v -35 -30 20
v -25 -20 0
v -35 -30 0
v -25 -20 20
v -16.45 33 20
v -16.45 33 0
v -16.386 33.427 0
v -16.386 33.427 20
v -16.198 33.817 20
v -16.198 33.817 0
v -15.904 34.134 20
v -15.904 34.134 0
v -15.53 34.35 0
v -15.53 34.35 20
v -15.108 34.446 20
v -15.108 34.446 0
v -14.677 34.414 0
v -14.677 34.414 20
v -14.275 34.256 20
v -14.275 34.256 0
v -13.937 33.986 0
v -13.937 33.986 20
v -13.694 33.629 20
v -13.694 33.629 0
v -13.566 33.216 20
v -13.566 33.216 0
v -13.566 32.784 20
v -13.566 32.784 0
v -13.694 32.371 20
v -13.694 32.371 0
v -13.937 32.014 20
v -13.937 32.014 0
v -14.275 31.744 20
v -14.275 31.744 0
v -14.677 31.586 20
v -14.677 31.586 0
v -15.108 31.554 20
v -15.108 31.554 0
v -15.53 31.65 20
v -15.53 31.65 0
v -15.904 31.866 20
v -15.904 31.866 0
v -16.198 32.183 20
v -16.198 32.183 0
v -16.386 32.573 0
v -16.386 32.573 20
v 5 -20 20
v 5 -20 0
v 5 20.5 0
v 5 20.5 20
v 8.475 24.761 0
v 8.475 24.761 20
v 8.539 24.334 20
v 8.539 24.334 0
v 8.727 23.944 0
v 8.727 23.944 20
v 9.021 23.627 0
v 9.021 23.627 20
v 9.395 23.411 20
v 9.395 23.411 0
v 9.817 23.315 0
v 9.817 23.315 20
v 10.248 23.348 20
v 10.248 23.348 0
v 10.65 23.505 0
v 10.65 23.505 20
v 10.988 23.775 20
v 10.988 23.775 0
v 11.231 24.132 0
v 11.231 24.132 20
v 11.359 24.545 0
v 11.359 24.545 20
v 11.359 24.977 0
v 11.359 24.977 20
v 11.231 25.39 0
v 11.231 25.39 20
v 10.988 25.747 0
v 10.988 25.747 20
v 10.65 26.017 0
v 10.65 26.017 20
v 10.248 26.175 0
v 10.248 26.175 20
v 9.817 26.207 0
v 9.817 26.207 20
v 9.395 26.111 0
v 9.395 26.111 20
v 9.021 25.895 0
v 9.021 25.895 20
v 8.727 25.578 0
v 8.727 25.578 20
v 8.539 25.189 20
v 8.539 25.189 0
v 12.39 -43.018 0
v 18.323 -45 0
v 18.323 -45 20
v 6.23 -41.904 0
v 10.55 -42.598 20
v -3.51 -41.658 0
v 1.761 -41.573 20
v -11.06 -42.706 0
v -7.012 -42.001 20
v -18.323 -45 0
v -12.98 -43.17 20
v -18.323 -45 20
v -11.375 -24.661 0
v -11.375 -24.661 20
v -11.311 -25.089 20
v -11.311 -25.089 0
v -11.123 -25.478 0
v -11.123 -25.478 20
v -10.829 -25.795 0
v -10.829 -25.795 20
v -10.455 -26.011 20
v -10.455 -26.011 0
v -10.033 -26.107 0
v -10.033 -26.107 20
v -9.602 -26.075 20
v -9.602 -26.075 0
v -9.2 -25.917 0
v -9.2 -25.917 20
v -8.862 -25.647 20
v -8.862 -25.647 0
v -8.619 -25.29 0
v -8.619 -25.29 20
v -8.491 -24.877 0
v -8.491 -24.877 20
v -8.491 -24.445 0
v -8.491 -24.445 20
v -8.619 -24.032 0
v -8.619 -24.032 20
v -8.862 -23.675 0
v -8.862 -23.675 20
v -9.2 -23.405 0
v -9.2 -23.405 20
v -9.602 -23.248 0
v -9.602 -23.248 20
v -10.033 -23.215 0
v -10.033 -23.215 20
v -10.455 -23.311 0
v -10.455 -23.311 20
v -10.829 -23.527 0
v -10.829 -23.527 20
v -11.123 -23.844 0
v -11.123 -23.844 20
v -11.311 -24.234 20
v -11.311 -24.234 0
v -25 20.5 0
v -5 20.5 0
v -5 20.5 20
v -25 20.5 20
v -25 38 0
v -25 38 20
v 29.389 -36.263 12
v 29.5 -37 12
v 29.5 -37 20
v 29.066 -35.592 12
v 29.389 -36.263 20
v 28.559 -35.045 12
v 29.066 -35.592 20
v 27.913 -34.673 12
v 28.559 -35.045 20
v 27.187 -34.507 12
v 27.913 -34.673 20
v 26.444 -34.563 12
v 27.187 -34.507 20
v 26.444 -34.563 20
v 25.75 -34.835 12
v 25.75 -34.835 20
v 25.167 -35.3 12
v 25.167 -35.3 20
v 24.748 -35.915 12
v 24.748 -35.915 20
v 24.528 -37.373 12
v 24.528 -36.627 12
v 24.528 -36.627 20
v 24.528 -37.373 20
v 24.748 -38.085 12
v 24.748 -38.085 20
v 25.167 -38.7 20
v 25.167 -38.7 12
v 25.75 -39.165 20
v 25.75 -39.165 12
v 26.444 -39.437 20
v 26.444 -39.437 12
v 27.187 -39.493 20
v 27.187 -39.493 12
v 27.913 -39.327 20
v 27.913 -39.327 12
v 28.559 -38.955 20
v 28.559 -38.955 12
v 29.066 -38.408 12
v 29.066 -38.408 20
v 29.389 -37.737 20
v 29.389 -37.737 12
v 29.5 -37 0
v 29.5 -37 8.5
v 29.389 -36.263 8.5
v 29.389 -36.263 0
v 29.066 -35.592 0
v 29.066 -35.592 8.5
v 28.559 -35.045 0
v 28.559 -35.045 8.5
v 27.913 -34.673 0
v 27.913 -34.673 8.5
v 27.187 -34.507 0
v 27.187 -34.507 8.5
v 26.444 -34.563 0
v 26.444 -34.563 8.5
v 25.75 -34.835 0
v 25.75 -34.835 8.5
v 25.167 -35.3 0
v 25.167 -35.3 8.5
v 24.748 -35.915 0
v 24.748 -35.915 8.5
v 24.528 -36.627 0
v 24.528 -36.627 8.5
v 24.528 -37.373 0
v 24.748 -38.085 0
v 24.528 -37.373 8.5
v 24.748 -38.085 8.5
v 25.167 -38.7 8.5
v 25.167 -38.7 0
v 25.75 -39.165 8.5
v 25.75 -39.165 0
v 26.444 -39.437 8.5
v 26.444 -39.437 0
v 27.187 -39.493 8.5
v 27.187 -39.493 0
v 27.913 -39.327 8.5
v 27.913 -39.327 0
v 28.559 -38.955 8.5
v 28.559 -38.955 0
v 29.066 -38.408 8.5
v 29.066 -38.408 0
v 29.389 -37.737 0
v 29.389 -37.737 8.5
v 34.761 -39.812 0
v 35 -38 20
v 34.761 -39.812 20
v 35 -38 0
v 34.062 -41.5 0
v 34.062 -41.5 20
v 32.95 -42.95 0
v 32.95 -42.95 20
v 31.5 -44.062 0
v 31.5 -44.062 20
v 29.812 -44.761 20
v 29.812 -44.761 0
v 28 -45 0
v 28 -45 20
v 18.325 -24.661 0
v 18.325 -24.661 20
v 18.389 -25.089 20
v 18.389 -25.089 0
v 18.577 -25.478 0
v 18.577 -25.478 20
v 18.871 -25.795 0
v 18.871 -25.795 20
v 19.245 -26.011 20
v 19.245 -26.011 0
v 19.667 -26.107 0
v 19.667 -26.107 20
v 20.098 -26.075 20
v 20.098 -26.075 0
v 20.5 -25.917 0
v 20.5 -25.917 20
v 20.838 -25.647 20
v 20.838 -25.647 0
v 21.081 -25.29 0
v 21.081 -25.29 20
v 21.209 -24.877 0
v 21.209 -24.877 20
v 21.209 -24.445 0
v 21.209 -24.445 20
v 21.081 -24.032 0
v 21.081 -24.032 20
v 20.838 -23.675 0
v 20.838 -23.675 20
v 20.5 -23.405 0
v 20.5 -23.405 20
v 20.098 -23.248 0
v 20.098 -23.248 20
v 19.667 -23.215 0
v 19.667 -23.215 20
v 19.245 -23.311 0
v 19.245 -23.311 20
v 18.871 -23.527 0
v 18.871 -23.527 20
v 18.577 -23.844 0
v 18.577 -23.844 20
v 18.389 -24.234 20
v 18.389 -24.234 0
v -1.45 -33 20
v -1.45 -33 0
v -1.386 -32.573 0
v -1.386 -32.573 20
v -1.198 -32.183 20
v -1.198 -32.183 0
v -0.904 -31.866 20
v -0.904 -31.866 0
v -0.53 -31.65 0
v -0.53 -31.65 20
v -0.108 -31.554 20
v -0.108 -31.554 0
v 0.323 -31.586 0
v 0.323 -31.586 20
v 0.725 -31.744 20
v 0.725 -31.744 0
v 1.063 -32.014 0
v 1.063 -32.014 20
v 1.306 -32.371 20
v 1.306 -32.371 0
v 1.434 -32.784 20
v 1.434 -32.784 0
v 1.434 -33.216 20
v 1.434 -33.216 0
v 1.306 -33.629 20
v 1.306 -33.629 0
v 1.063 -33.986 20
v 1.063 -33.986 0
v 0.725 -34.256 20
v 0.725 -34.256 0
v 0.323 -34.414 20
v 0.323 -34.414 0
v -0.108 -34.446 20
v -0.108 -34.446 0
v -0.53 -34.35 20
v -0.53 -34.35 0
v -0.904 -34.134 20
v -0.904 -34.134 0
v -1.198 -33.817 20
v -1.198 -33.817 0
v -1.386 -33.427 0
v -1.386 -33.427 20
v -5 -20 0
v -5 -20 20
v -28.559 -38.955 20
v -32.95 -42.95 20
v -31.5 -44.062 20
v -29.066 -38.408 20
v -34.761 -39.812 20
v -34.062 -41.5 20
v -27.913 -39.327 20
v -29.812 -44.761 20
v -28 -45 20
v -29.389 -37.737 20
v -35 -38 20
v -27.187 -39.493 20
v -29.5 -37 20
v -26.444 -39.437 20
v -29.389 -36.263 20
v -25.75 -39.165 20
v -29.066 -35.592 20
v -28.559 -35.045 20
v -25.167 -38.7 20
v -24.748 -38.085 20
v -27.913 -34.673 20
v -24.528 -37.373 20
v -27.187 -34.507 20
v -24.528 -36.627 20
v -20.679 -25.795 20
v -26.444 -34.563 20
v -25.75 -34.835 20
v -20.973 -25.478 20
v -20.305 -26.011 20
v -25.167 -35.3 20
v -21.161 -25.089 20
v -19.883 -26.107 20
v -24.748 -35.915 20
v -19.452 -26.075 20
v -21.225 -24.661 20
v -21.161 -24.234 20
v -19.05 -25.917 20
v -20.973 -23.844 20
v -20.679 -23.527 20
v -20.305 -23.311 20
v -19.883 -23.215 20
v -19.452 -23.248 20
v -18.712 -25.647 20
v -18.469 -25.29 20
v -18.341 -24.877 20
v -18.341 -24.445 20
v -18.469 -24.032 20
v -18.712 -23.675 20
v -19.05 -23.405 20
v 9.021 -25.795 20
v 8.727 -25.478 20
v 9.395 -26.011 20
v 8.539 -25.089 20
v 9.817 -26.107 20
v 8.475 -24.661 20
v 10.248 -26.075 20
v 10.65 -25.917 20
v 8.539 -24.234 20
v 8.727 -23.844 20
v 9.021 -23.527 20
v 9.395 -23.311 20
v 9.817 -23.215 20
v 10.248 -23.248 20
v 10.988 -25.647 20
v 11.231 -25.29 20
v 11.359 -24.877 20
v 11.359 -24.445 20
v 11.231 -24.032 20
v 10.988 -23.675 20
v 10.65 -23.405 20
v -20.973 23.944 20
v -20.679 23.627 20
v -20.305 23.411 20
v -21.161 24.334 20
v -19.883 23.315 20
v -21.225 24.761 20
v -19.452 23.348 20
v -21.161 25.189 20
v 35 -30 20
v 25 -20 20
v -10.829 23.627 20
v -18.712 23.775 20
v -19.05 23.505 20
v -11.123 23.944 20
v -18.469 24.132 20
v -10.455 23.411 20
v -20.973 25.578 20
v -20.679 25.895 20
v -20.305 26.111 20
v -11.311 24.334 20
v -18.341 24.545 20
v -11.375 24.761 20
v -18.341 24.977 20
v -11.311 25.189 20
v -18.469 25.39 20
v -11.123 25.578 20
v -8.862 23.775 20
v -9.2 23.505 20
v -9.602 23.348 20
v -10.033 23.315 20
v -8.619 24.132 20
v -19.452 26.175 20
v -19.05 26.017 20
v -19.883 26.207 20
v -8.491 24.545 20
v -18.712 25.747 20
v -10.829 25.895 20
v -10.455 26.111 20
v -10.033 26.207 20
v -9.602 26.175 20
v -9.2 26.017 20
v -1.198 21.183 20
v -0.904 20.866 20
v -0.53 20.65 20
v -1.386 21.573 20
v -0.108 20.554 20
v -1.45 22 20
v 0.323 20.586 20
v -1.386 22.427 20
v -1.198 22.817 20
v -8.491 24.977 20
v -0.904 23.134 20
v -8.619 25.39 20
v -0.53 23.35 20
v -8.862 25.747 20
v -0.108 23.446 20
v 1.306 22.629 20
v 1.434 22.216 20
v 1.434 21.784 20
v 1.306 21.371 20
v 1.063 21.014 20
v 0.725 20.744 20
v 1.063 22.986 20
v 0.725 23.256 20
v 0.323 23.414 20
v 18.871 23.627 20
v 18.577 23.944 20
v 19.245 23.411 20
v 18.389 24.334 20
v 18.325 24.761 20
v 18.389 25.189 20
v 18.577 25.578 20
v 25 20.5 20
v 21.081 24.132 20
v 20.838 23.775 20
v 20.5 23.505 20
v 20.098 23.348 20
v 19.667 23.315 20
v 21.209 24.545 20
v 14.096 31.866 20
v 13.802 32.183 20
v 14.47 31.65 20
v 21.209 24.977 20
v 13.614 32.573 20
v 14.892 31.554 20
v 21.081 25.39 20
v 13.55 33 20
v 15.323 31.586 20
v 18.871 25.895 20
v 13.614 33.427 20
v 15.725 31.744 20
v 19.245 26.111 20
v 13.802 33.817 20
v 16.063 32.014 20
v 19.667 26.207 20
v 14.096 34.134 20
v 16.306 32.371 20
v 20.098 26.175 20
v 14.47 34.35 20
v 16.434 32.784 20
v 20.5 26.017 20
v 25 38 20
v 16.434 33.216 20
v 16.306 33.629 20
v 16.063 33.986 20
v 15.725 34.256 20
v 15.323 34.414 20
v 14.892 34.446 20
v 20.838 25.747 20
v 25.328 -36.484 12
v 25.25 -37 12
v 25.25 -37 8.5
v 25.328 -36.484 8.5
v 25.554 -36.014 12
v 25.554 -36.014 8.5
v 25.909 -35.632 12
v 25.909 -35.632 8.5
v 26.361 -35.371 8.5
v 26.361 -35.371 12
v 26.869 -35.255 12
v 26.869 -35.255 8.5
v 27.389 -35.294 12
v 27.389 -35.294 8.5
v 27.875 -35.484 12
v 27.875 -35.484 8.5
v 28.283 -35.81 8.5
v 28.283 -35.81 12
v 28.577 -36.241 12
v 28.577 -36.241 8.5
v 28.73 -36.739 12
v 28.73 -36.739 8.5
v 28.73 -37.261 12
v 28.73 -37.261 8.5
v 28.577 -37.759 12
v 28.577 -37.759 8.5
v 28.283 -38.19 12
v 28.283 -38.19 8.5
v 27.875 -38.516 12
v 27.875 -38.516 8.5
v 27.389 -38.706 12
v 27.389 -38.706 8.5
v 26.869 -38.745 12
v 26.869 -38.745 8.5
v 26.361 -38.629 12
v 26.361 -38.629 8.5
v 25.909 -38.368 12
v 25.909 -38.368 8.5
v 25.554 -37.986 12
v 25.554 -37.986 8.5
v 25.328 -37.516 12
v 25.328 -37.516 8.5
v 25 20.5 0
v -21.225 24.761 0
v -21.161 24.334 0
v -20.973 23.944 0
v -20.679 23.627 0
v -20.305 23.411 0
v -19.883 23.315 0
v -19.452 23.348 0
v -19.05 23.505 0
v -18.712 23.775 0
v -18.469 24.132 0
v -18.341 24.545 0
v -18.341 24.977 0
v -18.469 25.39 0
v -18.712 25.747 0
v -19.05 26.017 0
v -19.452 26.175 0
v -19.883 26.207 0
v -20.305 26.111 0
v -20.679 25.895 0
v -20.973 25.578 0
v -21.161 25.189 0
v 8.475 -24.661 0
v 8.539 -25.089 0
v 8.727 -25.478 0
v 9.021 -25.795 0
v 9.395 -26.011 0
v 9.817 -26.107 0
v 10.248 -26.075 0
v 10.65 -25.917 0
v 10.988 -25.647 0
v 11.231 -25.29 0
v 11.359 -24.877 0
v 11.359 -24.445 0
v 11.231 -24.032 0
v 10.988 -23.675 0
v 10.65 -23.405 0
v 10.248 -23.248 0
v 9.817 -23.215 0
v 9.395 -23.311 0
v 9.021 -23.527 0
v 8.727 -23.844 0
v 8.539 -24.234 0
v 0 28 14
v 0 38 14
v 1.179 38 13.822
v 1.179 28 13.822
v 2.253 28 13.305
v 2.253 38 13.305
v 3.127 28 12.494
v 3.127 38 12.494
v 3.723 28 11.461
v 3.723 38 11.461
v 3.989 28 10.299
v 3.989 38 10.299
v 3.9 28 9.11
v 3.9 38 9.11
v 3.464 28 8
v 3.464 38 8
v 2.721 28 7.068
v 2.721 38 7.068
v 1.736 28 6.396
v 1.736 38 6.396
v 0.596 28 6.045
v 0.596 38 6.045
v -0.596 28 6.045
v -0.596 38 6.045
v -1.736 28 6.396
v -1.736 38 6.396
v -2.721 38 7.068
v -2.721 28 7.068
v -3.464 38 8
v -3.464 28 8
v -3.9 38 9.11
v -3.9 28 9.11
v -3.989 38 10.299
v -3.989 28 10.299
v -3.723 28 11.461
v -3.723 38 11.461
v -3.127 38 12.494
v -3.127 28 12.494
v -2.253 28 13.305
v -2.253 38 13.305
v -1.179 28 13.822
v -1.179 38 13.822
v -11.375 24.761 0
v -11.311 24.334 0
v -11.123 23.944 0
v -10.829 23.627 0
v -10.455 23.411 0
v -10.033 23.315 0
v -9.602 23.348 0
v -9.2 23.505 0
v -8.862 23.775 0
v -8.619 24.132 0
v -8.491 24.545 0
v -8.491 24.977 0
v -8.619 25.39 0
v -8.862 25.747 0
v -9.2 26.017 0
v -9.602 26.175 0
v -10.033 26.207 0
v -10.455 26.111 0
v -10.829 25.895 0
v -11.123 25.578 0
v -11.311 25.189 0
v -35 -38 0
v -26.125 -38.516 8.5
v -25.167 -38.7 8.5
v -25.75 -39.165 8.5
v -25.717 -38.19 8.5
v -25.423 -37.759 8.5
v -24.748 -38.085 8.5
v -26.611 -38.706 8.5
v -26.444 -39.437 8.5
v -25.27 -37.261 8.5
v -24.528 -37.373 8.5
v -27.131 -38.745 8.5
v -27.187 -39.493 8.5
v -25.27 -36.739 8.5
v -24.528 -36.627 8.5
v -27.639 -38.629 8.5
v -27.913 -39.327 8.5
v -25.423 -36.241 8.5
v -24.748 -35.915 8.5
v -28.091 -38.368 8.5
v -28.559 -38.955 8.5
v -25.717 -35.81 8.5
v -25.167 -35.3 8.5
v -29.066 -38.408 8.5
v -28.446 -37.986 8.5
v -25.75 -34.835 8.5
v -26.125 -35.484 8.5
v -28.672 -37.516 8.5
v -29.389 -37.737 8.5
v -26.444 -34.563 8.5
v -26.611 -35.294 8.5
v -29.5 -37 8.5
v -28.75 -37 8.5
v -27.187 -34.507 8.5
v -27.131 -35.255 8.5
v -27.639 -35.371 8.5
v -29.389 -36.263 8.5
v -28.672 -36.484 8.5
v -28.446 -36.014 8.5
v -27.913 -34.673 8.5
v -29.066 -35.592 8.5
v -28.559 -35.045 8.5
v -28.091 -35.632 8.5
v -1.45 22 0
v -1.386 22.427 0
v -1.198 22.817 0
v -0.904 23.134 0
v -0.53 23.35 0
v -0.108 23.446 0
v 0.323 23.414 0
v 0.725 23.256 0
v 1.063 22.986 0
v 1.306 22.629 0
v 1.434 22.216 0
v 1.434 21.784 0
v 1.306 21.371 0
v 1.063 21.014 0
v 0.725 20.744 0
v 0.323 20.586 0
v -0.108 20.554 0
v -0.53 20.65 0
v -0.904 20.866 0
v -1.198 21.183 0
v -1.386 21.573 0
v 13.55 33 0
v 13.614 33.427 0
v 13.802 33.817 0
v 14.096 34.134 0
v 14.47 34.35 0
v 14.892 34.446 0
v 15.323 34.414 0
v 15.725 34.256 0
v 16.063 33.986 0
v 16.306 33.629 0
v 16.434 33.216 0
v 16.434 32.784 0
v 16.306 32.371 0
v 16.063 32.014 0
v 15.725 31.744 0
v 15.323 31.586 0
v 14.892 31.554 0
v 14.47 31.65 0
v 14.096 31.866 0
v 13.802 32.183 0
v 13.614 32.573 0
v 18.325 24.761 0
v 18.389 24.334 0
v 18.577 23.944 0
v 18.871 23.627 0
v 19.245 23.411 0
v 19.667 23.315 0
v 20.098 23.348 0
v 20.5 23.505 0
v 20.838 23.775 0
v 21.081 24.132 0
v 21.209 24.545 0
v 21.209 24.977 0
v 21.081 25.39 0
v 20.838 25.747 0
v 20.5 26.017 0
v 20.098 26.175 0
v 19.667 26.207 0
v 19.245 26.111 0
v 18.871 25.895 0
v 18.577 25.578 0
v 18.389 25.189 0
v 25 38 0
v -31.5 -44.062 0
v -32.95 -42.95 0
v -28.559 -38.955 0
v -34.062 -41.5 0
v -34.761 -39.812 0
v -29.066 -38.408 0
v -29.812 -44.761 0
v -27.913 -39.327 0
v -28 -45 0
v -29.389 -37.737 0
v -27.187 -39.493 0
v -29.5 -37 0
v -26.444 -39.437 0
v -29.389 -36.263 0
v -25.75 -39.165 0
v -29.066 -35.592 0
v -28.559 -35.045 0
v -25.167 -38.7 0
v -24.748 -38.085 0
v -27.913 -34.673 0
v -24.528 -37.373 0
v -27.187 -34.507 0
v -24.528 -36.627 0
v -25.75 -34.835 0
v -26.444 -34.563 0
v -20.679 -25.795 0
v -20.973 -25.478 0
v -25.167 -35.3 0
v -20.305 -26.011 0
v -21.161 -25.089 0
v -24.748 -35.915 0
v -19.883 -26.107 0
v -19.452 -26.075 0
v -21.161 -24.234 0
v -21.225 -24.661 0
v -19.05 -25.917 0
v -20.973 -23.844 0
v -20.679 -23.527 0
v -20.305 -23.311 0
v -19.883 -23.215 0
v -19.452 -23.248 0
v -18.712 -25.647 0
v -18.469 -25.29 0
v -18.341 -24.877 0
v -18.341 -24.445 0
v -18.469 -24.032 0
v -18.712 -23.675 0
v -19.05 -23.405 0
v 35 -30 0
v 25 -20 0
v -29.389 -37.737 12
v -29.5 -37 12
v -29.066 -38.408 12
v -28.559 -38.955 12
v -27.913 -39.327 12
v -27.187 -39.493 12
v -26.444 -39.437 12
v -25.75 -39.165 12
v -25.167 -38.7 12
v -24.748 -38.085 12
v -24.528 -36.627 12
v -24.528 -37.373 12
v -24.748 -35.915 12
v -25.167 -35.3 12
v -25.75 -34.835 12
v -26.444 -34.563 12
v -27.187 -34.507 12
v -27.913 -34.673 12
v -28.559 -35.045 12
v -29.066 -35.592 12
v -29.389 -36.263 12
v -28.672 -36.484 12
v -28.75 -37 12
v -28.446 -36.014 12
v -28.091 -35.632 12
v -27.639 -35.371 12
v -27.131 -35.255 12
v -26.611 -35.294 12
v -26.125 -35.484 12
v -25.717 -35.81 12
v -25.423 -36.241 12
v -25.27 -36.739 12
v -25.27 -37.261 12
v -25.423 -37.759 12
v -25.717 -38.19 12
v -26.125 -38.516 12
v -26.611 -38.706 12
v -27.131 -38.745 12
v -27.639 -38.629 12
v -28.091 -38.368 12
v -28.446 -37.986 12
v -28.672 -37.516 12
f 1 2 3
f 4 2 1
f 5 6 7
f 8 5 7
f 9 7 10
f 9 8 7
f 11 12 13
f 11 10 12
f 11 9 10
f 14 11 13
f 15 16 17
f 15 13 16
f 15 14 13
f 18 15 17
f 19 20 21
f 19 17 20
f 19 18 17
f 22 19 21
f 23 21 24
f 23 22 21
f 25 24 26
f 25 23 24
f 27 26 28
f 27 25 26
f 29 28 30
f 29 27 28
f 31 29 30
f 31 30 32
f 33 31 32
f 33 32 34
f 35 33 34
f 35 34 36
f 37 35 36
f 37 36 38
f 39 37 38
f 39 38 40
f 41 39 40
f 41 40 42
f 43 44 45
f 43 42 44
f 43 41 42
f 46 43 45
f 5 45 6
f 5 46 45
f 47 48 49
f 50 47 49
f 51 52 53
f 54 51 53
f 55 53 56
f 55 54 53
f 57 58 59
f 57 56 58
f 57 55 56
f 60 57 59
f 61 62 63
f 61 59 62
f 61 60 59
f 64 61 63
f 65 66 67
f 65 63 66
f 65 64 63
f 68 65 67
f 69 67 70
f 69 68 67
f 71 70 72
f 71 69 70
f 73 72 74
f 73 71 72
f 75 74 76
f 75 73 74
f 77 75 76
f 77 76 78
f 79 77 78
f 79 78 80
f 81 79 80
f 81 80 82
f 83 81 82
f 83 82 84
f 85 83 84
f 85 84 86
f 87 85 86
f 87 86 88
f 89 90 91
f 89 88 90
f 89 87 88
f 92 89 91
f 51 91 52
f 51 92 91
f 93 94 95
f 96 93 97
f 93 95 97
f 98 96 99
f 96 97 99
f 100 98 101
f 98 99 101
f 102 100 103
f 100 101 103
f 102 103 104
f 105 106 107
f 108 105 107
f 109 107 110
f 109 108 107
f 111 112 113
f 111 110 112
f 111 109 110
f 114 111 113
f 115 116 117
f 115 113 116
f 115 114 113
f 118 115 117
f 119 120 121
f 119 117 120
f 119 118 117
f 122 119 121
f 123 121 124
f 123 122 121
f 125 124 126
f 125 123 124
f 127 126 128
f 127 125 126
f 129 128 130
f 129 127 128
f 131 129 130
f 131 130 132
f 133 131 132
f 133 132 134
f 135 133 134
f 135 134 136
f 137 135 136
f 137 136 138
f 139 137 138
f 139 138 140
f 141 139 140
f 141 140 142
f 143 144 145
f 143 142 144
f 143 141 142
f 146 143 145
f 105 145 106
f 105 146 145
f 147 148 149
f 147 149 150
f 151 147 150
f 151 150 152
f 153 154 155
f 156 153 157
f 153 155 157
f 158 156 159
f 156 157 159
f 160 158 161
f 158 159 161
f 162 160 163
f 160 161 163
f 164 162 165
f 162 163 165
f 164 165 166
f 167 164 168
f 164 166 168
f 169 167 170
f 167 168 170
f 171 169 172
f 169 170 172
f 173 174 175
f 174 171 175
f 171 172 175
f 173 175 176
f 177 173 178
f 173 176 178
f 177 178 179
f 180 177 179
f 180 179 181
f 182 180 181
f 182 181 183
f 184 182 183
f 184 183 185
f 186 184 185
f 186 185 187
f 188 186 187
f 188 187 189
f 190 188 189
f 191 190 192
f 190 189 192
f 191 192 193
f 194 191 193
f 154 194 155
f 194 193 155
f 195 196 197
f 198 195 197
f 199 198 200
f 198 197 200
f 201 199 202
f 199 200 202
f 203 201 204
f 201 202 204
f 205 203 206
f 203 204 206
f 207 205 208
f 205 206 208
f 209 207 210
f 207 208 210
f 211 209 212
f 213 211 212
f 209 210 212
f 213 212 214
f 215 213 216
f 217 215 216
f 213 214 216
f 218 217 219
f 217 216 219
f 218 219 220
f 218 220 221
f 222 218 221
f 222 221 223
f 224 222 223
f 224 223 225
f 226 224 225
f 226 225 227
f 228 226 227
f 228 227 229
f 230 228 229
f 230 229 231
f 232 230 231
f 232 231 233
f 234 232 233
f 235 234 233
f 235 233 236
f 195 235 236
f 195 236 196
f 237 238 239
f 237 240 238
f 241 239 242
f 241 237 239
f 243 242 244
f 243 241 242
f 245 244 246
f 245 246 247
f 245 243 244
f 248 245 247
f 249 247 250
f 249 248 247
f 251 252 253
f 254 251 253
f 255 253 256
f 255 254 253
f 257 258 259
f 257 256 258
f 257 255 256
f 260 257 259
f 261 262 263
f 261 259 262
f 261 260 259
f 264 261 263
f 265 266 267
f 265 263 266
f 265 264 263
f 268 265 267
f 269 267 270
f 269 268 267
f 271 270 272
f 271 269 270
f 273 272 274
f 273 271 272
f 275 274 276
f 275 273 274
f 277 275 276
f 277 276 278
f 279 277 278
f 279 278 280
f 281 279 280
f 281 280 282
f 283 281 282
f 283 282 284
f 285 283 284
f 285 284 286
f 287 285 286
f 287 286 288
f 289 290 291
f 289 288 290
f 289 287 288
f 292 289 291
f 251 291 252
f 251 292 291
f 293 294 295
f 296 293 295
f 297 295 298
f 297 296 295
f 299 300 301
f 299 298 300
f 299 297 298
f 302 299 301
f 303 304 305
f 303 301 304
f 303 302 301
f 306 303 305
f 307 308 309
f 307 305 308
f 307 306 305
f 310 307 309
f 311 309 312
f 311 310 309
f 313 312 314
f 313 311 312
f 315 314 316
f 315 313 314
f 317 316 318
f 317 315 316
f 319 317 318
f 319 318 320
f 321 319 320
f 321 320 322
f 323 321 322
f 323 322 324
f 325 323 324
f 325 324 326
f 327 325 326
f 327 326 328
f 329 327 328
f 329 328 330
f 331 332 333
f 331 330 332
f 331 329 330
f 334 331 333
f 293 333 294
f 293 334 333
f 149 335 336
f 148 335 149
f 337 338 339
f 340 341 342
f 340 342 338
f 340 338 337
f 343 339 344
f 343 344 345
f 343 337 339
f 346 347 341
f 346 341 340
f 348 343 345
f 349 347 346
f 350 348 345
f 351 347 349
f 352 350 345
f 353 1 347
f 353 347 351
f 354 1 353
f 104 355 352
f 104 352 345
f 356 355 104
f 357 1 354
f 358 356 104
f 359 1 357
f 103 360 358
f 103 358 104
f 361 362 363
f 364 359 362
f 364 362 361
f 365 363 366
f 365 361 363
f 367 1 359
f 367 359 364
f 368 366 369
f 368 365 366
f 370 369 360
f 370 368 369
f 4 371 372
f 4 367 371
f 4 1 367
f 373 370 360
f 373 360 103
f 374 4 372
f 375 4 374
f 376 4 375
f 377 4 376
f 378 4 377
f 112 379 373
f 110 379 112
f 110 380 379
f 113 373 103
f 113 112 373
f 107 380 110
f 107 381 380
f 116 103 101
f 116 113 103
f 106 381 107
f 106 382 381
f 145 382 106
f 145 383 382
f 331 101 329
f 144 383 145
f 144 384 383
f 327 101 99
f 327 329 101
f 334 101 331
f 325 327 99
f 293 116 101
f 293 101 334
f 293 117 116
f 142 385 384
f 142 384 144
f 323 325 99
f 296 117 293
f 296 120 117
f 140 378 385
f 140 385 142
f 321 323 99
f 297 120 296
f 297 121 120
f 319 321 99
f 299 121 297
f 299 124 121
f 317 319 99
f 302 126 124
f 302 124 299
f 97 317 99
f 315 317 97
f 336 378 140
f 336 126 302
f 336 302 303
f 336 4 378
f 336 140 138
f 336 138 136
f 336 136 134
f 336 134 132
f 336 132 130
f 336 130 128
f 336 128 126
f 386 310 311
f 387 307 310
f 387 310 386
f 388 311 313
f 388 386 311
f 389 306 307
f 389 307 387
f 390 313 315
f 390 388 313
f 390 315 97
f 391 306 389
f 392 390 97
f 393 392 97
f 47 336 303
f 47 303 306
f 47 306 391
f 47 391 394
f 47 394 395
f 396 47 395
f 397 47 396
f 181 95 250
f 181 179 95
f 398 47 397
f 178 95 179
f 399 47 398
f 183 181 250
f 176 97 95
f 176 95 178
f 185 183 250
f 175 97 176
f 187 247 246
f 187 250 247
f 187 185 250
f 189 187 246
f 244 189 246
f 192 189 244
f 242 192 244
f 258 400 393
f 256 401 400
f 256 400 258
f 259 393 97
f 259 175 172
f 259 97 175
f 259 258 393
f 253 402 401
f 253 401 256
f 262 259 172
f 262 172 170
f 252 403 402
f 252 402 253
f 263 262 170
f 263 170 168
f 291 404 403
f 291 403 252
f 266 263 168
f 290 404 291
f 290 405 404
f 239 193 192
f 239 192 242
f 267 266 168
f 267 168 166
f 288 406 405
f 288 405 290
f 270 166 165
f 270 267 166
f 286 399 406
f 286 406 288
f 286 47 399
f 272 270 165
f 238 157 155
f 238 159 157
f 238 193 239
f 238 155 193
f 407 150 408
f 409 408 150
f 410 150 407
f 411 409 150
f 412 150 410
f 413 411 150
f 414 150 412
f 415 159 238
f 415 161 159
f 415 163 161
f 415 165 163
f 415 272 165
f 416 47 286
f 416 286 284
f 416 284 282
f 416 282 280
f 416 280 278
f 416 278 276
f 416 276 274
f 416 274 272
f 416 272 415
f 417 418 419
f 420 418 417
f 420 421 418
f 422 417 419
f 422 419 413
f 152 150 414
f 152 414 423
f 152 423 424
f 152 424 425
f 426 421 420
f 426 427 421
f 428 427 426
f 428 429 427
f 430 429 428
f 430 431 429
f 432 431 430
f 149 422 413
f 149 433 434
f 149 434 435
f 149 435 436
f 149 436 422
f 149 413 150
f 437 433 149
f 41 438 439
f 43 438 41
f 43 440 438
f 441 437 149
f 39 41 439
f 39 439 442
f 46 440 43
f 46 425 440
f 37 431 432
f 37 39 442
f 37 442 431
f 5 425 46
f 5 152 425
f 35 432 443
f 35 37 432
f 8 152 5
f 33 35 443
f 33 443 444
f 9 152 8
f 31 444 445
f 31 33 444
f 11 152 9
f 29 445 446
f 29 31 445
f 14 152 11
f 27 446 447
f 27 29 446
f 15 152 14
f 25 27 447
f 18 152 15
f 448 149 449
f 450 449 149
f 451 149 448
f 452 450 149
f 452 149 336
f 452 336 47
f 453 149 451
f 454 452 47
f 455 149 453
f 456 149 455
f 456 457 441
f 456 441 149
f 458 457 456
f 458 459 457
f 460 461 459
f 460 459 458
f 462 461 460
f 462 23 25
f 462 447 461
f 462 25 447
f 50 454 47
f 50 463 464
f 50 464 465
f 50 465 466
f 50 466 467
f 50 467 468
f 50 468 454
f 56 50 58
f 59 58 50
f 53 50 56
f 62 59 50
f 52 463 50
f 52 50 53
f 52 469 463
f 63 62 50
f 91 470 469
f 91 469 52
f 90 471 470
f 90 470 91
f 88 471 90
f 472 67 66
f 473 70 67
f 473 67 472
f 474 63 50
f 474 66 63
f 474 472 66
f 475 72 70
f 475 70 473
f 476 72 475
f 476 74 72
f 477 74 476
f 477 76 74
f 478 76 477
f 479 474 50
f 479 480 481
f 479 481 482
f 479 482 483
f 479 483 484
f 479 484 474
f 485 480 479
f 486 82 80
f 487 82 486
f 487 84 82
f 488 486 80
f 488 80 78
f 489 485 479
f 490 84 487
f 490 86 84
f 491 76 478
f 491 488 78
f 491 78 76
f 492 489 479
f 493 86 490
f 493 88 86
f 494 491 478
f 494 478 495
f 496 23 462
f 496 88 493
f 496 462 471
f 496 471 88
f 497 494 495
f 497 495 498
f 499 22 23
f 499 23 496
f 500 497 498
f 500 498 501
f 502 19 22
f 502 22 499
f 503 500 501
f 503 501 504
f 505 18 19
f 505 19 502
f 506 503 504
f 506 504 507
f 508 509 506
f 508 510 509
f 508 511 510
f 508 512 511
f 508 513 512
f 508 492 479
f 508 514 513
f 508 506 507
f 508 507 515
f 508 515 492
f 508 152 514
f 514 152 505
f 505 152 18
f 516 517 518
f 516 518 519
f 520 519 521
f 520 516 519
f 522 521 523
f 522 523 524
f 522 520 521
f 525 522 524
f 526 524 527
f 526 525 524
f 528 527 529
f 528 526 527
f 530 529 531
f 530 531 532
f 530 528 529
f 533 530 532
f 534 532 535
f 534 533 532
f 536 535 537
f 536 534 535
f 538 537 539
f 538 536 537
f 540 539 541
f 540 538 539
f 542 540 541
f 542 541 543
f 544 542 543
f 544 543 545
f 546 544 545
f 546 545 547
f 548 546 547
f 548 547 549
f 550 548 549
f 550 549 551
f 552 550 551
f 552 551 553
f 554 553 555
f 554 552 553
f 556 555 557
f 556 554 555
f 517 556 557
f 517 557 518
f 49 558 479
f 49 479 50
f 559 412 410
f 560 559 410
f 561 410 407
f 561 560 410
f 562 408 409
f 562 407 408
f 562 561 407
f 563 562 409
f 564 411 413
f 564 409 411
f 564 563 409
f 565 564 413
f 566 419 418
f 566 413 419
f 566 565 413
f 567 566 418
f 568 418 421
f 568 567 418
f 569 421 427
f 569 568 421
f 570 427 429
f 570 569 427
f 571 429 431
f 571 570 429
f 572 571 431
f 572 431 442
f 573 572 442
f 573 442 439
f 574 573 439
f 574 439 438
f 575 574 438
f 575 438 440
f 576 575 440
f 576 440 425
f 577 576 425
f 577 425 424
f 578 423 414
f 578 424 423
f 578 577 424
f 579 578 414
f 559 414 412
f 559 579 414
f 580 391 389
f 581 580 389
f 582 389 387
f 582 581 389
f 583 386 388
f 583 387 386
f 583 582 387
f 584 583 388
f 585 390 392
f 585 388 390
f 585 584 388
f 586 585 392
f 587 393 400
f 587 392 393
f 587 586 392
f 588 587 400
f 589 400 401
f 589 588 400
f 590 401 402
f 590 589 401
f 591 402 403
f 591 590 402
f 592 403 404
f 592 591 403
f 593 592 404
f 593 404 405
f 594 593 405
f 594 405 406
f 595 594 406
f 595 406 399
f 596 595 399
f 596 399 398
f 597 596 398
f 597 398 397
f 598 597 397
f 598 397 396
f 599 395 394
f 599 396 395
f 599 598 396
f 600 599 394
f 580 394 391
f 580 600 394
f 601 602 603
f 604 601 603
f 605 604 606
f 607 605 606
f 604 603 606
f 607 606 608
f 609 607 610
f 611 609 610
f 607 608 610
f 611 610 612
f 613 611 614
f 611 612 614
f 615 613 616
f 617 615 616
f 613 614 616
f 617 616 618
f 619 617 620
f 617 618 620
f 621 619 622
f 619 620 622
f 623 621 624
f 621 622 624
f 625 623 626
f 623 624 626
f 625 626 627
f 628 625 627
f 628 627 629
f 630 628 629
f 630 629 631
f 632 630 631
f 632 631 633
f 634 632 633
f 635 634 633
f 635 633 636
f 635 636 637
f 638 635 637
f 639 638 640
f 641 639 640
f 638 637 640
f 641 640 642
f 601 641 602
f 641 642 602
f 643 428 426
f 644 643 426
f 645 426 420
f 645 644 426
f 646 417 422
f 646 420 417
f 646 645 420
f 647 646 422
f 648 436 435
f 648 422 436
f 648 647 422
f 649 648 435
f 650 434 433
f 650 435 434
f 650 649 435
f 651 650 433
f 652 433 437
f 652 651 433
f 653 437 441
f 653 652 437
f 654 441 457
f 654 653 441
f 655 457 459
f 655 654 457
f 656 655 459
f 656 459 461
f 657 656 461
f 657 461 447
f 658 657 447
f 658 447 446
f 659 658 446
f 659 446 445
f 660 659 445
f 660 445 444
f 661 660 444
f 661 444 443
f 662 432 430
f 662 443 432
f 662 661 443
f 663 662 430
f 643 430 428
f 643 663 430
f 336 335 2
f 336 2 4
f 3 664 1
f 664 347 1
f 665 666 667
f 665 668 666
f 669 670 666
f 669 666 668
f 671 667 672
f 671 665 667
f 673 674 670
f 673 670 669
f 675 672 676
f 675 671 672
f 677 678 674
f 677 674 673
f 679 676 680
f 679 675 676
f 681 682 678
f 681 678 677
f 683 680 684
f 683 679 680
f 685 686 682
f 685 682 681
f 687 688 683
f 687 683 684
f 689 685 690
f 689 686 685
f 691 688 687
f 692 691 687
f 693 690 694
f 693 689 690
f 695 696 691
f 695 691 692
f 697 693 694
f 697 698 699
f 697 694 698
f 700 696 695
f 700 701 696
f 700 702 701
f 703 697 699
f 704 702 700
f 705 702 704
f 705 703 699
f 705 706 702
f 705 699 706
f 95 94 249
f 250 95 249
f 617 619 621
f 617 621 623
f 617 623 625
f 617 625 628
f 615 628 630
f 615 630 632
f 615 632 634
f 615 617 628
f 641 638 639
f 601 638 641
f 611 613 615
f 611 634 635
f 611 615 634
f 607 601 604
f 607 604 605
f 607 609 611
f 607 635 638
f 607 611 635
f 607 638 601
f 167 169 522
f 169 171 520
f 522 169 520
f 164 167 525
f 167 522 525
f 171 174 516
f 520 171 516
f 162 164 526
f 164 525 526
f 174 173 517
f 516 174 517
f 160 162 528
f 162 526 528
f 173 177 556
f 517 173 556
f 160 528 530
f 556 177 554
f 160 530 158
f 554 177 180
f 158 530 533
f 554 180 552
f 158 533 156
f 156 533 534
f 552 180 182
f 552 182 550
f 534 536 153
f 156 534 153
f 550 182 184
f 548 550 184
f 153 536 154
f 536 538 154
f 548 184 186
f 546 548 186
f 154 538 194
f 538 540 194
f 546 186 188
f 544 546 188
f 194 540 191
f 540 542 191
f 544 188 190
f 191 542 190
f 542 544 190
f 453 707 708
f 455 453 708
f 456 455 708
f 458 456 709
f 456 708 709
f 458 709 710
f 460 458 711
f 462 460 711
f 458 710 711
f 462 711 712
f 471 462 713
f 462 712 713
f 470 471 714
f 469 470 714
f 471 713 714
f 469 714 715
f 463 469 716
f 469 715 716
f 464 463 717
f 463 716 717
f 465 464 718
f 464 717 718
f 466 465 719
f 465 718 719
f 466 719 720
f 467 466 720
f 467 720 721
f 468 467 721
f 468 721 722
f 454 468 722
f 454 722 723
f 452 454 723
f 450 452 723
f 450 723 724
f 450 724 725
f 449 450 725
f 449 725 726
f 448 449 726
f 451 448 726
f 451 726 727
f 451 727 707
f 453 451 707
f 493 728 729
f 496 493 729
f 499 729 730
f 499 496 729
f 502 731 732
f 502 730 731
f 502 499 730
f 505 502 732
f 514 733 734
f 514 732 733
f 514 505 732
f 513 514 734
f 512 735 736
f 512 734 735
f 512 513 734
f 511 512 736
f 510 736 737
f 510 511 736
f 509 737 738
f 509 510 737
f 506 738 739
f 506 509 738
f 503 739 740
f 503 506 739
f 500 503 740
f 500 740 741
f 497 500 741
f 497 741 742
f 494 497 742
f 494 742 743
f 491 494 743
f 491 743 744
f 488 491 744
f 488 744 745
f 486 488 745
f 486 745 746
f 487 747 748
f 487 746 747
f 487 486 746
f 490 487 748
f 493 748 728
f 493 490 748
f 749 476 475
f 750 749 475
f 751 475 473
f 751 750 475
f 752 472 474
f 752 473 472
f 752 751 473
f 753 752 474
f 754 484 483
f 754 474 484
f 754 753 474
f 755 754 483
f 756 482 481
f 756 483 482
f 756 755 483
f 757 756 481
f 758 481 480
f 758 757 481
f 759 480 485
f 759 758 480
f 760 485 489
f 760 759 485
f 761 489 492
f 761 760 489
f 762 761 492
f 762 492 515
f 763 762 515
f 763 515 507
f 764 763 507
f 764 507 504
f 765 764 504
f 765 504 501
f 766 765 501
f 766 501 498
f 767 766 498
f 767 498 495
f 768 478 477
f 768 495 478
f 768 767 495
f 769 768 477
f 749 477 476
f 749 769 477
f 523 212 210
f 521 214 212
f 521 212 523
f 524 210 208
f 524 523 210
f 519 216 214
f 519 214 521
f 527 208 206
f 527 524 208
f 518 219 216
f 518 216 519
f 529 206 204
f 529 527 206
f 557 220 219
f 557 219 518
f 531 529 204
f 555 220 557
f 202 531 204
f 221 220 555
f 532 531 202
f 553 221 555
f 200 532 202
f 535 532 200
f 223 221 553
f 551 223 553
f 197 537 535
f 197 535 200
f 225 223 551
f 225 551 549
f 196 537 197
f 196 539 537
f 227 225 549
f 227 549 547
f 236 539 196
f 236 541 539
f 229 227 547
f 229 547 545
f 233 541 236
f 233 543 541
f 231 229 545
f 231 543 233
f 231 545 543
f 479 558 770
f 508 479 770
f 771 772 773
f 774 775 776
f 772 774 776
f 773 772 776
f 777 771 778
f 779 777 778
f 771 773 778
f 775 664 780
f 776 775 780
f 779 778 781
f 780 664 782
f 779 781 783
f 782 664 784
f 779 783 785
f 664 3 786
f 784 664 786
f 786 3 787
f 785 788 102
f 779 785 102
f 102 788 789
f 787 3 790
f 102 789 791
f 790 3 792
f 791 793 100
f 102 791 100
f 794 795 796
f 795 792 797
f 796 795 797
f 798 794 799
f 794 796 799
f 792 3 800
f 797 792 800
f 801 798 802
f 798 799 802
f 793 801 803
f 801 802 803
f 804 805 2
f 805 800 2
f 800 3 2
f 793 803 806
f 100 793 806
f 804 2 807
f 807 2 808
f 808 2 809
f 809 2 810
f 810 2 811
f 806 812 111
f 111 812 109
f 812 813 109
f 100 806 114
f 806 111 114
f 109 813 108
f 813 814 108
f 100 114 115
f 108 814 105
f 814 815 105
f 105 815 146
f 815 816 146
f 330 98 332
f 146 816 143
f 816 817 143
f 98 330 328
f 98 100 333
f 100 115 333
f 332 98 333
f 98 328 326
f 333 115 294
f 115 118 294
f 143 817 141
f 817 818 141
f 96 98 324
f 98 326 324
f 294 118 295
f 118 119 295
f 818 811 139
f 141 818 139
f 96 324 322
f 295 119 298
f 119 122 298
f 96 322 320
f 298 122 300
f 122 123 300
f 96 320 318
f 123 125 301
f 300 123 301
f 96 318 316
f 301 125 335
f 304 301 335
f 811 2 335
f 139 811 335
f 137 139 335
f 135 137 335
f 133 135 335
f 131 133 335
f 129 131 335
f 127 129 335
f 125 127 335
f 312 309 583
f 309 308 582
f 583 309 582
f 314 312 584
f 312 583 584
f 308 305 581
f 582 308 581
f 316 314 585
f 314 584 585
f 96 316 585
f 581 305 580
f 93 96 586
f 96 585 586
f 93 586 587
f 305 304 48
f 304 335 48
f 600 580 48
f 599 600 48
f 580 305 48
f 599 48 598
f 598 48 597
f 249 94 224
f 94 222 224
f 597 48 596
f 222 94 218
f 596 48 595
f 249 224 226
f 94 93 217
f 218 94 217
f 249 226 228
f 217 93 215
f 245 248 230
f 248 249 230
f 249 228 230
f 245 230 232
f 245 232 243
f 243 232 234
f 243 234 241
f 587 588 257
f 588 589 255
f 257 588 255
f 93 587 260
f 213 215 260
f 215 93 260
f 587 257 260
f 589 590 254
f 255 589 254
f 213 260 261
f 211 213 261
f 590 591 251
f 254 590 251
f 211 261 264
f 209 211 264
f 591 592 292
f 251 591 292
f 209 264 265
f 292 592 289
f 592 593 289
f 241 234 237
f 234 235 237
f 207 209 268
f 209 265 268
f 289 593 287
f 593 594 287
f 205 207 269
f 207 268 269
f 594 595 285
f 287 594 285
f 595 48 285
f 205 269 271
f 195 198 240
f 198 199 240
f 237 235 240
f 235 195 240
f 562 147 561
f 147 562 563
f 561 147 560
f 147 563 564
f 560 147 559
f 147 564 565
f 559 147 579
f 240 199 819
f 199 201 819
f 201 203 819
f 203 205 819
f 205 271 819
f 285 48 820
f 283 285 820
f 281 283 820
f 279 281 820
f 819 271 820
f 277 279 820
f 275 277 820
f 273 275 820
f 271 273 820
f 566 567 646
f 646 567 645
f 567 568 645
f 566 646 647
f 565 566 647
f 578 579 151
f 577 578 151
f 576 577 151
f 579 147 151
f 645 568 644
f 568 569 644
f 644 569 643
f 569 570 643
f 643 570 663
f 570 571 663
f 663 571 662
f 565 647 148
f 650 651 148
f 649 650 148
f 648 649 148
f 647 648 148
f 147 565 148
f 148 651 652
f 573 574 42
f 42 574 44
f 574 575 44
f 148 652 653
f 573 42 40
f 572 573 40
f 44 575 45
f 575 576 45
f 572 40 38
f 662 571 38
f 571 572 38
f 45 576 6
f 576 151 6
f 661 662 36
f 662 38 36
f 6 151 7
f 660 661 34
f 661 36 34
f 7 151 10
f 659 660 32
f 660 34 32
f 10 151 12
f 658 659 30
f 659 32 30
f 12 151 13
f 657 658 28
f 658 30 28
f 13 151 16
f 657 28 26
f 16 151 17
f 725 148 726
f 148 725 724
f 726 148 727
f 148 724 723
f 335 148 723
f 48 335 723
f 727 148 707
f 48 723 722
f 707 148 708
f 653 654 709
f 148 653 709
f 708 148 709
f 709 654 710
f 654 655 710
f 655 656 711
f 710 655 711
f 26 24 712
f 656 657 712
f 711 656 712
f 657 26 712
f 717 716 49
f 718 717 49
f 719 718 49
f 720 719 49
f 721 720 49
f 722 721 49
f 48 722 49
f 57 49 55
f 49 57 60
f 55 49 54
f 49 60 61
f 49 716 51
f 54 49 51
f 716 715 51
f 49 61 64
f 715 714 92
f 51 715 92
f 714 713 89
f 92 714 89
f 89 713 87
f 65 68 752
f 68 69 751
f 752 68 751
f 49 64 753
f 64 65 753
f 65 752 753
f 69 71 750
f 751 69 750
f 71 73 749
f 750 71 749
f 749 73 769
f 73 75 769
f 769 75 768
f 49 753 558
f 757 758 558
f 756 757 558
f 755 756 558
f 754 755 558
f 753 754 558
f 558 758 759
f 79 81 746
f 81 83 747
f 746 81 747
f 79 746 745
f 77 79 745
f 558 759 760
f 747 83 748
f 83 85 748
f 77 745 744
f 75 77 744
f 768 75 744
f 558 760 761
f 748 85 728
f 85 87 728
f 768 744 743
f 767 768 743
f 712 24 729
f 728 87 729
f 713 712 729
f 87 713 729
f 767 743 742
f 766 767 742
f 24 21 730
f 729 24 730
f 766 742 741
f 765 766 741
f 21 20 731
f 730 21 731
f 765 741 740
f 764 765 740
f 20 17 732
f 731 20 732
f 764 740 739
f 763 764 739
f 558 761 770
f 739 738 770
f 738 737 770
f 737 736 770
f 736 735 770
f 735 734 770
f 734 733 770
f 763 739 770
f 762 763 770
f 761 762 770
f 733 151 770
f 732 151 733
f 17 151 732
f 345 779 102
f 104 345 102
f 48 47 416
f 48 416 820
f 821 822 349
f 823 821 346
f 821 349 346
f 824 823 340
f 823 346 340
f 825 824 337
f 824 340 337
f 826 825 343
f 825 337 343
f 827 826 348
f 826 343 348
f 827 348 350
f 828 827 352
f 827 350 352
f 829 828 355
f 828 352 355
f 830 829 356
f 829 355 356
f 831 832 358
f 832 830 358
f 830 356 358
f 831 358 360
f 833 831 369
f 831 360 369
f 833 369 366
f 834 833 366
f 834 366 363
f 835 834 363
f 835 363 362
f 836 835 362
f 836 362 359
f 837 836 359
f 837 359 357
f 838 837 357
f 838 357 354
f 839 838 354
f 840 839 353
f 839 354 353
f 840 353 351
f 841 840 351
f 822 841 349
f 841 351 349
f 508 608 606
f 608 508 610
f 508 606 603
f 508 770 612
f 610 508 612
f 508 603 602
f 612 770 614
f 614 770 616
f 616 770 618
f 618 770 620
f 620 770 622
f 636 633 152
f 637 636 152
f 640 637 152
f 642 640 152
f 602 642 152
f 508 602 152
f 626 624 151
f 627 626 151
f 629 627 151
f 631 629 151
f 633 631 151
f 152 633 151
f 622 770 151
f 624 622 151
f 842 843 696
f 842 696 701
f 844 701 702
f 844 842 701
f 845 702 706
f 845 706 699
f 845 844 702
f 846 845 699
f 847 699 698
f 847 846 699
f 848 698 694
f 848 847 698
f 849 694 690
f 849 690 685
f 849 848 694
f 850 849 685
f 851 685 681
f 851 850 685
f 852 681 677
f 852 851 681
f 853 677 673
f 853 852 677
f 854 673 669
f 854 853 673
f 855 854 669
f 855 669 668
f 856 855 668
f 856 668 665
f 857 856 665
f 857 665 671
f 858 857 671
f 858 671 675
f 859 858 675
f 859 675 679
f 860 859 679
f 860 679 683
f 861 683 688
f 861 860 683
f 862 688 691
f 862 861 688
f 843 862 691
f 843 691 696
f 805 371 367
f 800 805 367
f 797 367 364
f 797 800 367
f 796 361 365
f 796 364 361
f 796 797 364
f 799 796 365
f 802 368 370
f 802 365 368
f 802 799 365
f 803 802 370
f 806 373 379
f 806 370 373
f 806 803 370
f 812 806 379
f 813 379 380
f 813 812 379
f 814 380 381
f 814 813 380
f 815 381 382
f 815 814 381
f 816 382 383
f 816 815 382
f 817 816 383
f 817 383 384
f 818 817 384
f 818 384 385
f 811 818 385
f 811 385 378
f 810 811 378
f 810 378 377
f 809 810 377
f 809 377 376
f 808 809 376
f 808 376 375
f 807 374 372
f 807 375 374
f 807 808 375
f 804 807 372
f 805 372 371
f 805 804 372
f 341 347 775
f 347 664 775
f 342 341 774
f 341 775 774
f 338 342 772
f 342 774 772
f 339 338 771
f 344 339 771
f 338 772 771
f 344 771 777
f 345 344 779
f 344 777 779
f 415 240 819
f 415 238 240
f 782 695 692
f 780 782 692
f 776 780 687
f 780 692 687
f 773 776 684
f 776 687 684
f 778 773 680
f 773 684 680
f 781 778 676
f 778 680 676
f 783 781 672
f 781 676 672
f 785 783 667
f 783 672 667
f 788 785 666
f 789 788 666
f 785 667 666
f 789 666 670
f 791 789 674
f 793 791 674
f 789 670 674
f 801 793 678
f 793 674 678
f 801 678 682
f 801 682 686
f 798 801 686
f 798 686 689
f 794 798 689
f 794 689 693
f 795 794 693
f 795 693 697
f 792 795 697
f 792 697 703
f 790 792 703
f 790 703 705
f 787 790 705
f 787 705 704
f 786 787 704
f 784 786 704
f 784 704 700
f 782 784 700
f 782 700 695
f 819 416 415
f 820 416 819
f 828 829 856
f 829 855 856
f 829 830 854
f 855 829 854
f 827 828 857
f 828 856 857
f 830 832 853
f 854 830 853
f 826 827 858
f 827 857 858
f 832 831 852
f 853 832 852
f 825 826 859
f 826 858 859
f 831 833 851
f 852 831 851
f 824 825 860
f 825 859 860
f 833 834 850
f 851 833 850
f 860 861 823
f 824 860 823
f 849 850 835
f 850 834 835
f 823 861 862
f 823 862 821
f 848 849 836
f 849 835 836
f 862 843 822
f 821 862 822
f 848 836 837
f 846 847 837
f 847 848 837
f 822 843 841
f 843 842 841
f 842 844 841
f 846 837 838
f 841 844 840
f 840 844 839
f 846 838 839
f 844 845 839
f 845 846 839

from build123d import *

# Parameters (mm, degrees)
SKETCH_1_W                = 50
SKETCH_1_H                = 80
EXTRUDE_1_DEPTH           = 20
CUT_EXTRUDE_1_DEPTH       = 18
CUT_EXTRUDE_1_DEPTH_BACK  = 48
SKETCH_2_W                = 40
SKETCH_2_H                = 40
CUT_EXTRUDE_2_DEPTH       = 25
CUT_EXTRUDE_2_DEPTH_BACK  = 50
SKETCH_3_R                = 1.45
SKETCH_5_W                = 20
SKETCH_5_H                = 20
EXTRUDE_3_DEPTH           = 10
SKETCH_6_W                = 20
SKETCH_6_H                = 20
EXTRUDE_4_DEPTH           = 10
SKETCH_11_W               = 70
SKETCH_11_H               = 5
EXTRUDE_6_DEPTH           = 20
SKETCH_12_R               = 2.5
CUT_EXTRUDE_6_DEPTH       = 26
CHAMFER_1_SIZE            = 10
SKETCH_14_W               = 25
SKETCH_14_H               = 15
EXTRUDE_7_DEPTH           = 20
CHAMFER_2_SIZE            = 3
CHAMFER_3_SIZE            = 2
CUT_EXTRUDE_8_DEPTH       = 30
CUT_EXTRUDE_8_DEPTH_BACK  = 57
SKETCH_17_R               = 1.45
SKETCH_18_W               = 26.067158979
SKETCH_18_H               = 13.506639349
CUT_EXTRUDE_9_DEPTH       = 42
SKETCH_19_RX              = 28.99919082
SKETCH_19_RY              = 15.360713199
CUT_EXTRUDE_10_DEPTH      = 42
FILLET_1_R                = 7
EXTRUDE_START             = -12
SKETCH_20_R               = 2.5
SKETCH_20_R_2             = 1.75
EXTRUDE_8_DEPTH           = 3.5
SKETCH_21_W               = 20
SKETCH_21_H               = 0.5
CUT_EXTRUDE_11_DEPTH      = 31
SKETCH_22_W               = 50
SKETCH_22_H               = 2
CUT_EXTRUDE_12_DEPTH      = 31
CUT_EXTRUDE_14_DEPTH      = 14
CUT_EXTRUDE_14_DEPTH_BACK = 53
SKETCH_24_R               = 1.45
SKETCH_25_R               = 1.45
CUT_EXTRUDE_16_DEPTH      = 26
SKETCH_26_R               = 4
CUT_EXTRUDE_17_DEPTH      = 10


with BuildPart() as part:
    # 草图1 → 凸台-拉伸1 (new body)
    with BuildSketch(Plane.XY):
        Rectangle(SKETCH_1_W, SKETCH_1_H)
    extrude(amount=EXTRUDE_1_DEPTH)

    # 草图2 → 切除-拉伸1 (cut, two sides: drawn at the far end of the back side and taken through both)
    with BuildSketch(Plane.XY.offset(20).offset(-CUT_EXTRUDE_1_DEPTH_BACK)):
        with Locations((-25, 0)):
            Rectangle(SKETCH_2_W, SKETCH_2_H)
        with Locations((25, 0)):
            Rectangle(SKETCH_2_W, SKETCH_2_H)
    extrude(amount=CUT_EXTRUDE_1_DEPTH + CUT_EXTRUDE_1_DEPTH_BACK, mode=Mode.SUBTRACT)

    # 草图3 → 切除-拉伸2 (cut, two sides: drawn at the far end of the back side and taken through both)
    with BuildSketch(Plane.XY.offset(20).offset(-CUT_EXTRUDE_2_DEPTH_BACK)):
        with Locations(Location((9.925, -24.661145618, 0), (0, 0, 180))):
            Circle(SKETCH_3_R)
        with Locations(Location((19.775, -24.661145618, 0), (0, 0, 180))):
            Circle(SKETCH_3_R)
        with Locations(Location((9.925, 24.761145618, 0), (0, 0, 180))):
            Circle(SKETCH_3_R)
        with Locations(Location((19.775, 24.761145618, 0), (0, 0, 180))):
            Circle(SKETCH_3_R)
        with Locations(Location((-9.925, 24.761145618, 0), (0, 0, 180))):
            Circle(SKETCH_3_R)
        with Locations(Location((-19.775, 24.761145618, 0), (0, 0, 180))):
            Circle(SKETCH_3_R)
        with Locations(Location((-9.925, -24.661145618, 0), (0, 0, 180))):
            Circle(SKETCH_3_R)
        with Locations(Location((-19.775, -24.661145618, 0), (0, 0, 180))):
            Circle(SKETCH_3_R)
    extrude(amount=CUT_EXTRUDE_2_DEPTH + CUT_EXTRUDE_2_DEPTH_BACK, mode=Mode.SUBTRACT)

    # 草图5 → 凸台-拉伸3 (add)
    with BuildSketch(Plane(origin=(25, 0, 0), x_dir=(0, 0, -1), z_dir=(1, 0, 0))):
        with Locations((-10, -30)):
            Rectangle(SKETCH_5_W, SKETCH_5_H)
    extrude(amount=EXTRUDE_3_DEPTH)

    # 草图6 → 凸台-拉伸4 (add)
    with BuildSketch(Plane.ZY.offset(25)):
        with Locations((10, -30)):
            Rectangle(SKETCH_6_W, SKETCH_6_H)
    extrude(amount=EXTRUDE_4_DEPTH)

    # 草图11 → 凸台-拉伸6 (add)
    with BuildSketch(Plane.XY.offset(20)):
        with Locations((0, -42.5)):
            Rectangle(SKETCH_11_W, SKETCH_11_H)
    extrude(amount=-EXTRUDE_6_DEPTH)

    # 草图12 → 切除-拉伸6 (cut)
    with BuildSketch(Plane.XY.offset(20)):
        with Locations((27, -37)):
            Circle(SKETCH_12_R)
        with Locations(Location((-27, -37, 0), (0, 0, 180))):
            Circle(SKETCH_12_R)
    extrude(amount=-CUT_EXTRUDE_6_DEPTH, mode=Mode.SUBTRACT)

    # 倒角1
    chamfer_1_edges = [part.edges().sort_by_distance(p)[0] for p in [
        (35, -20, 10),
        (-35, -20, 10),
    ]]
    chamfer(chamfer_1_edges, length=CHAMFER_1_SIZE)

    # 草图14 → 凸台-拉伸7 (add)
    with BuildSketch(Plane.XY.offset(20)):
        with Locations((0, -45)):
            Rectangle(SKETCH_14_W, SKETCH_14_H)
    extrude(amount=-EXTRUDE_7_DEPTH)

    # 倒角2
    chamfer_2_edges = [part.edges().sort_by_distance(p)[0] for p in [
        (12.5, -52.5, 10),
        (-12.5, -52.5, 10),
    ]]
    chamfer(chamfer_2_edges, length=CHAMFER_2_SIZE)

    # 倒角3
    chamfer_3_edges = [part.edges().sort_by_distance(p)[0] for p in [
        (0, -52.5, 0),
        (0, -52.5, 20),
    ]]
    chamfer(chamfer_3_edges, length=CHAMFER_3_SIZE)

    # 草图17 → 切除-拉伸8 (cut, two sides: drawn at the far end of the back side and taken through both)
    with BuildSketch(Plane(origin=(0, 0, 0), x_dir=(-1, 0, 0), z_dir=(0, 0, -1)).offset(-CUT_EXTRUDE_8_DEPTH_BACK)):
        with Locations((15, 33)):
            Circle(SKETCH_17_R)
        with Locations((-15, 33)):
            Circle(SKETCH_17_R)
    extrude(amount=CUT_EXTRUDE_8_DEPTH + CUT_EXTRUDE_8_DEPTH_BACK, mode=Mode.SUBTRACT)

    # 草图18 → 切除-拉伸9 (cut)
    with BuildSketch(Plane.XY.offset(20)):
        with Locations((-0.53357949, -51.753319675)):
            Rectangle(SKETCH_18_W, SKETCH_18_H)
    extrude(amount=-CUT_EXTRUDE_9_DEPTH, mode=Mode.SUBTRACT)

    # 草图19 → 切除-拉伸10 (cut)
    with BuildSketch(Plane.XY.offset(20)):
        with Locations(Location((0, -56.905793797), (0, 0, 0))):
            Ellipse(SKETCH_19_RX, SKETCH_19_RY)
    extrude(amount=-CUT_EXTRUDE_10_DEPTH, mode=Mode.SUBTRACT)

    # 圆角1
    fillet_1_edges = [part.edges().sort_by_distance(p)[0] for p in [
        (-35, -45, 10),
        (35, -45, 10),
    ]]
    fillet(fillet_1_edges, radius=FILLET_1_R)

    # 草图20 → 凸台-拉伸8 (add)
    # profile 1 of 2: a face of its own
    with BuildSketch(Plane(origin=(0, 0, 0), x_dir=(-1, 0, 0), z_dir=(0, 0, -1)).offset(EXTRUDE_START)):
        with Locations((27, -37)):
            Circle(SKETCH_20_R)
        with Locations((27, -37)):
            Circle(SKETCH_20_R_2, mode=Mode.SUBTRACT)
    # profile 2 of 2: a face of its own
    with BuildSketch(Plane(origin=(0, 0, 0), x_dir=(-1, 0, 0), z_dir=(0, 0, -1)).offset(EXTRUDE_START)):
        with Locations(Location((-27, -37, 0), (0, 0, 180))):
            Circle(SKETCH_20_R)
        with Locations((-27, -37)):
            Circle(SKETCH_20_R_2, mode=Mode.SUBTRACT)
    extrude(amount=EXTRUDE_8_DEPTH)

    # 草图21 → 切除-拉伸11 (cut)
    with BuildSketch(Plane(origin=(0, 0, 0), x_dir=(-1, 0, 0), z_dir=(0, 0, -1))):
        with Locations((-15, 20.25)):
            Rectangle(SKETCH_21_W, SKETCH_21_H)
        with Locations((15, 20.25)):
            Rectangle(SKETCH_21_W, SKETCH_21_H)
    extrude(amount=-CUT_EXTRUDE_11_DEPTH, mode=Mode.SUBTRACT)

    # 草图22 → 切除-拉伸12 (cut)
    with BuildSketch(Plane(origin=(0, 0, 0), x_dir=(-1, 0, 0), z_dir=(0, 0, -1))):
        with Locations((0, 39)):
            Rectangle(SKETCH_22_W, SKETCH_22_H)
    extrude(amount=-CUT_EXTRUDE_12_DEPTH, mode=Mode.SUBTRACT)

    # 草图24 → 切除-拉伸14 (cut, two sides: drawn at the far end of the back side and taken through both)
    with BuildSketch(Plane(origin=(0, 0, 0), x_dir=(-1, 0, 0), z_dir=(0, 0, -1)).offset(-CUT_EXTRUDE_14_DEPTH_BACK)):
        with Locations((0, -33)):
            Circle(SKETCH_24_R)
    extrude(amount=CUT_EXTRUDE_14_DEPTH + CUT_EXTRUDE_14_DEPTH_BACK, mode=Mode.SUBTRACT)

    # 草图25 → 切除-拉伸16 (cut)
    with BuildSketch(Plane(origin=(0, 0, 0), x_dir=(-1, 0, 0), z_dir=(0, 0, -1))):
        with Locations((0, 22)):
            Circle(SKETCH_25_R)
    extrude(amount=-CUT_EXTRUDE_16_DEPTH, mode=Mode.SUBTRACT)

    # 草图26 → 切除-拉伸17 (cut)
    with BuildSketch(Plane(origin=(0, 38, 0), x_dir=(1, 0, 0), z_dir=(0, 1, 0))):
        with Locations(Location((0, -10, 0), (0, 0, 270))):
            Circle(SKETCH_26_R)
    extrude(amount=-CUT_EXTRUDE_17_DEPTH, mode=Mode.SUBTRACT)


solid = part.part
